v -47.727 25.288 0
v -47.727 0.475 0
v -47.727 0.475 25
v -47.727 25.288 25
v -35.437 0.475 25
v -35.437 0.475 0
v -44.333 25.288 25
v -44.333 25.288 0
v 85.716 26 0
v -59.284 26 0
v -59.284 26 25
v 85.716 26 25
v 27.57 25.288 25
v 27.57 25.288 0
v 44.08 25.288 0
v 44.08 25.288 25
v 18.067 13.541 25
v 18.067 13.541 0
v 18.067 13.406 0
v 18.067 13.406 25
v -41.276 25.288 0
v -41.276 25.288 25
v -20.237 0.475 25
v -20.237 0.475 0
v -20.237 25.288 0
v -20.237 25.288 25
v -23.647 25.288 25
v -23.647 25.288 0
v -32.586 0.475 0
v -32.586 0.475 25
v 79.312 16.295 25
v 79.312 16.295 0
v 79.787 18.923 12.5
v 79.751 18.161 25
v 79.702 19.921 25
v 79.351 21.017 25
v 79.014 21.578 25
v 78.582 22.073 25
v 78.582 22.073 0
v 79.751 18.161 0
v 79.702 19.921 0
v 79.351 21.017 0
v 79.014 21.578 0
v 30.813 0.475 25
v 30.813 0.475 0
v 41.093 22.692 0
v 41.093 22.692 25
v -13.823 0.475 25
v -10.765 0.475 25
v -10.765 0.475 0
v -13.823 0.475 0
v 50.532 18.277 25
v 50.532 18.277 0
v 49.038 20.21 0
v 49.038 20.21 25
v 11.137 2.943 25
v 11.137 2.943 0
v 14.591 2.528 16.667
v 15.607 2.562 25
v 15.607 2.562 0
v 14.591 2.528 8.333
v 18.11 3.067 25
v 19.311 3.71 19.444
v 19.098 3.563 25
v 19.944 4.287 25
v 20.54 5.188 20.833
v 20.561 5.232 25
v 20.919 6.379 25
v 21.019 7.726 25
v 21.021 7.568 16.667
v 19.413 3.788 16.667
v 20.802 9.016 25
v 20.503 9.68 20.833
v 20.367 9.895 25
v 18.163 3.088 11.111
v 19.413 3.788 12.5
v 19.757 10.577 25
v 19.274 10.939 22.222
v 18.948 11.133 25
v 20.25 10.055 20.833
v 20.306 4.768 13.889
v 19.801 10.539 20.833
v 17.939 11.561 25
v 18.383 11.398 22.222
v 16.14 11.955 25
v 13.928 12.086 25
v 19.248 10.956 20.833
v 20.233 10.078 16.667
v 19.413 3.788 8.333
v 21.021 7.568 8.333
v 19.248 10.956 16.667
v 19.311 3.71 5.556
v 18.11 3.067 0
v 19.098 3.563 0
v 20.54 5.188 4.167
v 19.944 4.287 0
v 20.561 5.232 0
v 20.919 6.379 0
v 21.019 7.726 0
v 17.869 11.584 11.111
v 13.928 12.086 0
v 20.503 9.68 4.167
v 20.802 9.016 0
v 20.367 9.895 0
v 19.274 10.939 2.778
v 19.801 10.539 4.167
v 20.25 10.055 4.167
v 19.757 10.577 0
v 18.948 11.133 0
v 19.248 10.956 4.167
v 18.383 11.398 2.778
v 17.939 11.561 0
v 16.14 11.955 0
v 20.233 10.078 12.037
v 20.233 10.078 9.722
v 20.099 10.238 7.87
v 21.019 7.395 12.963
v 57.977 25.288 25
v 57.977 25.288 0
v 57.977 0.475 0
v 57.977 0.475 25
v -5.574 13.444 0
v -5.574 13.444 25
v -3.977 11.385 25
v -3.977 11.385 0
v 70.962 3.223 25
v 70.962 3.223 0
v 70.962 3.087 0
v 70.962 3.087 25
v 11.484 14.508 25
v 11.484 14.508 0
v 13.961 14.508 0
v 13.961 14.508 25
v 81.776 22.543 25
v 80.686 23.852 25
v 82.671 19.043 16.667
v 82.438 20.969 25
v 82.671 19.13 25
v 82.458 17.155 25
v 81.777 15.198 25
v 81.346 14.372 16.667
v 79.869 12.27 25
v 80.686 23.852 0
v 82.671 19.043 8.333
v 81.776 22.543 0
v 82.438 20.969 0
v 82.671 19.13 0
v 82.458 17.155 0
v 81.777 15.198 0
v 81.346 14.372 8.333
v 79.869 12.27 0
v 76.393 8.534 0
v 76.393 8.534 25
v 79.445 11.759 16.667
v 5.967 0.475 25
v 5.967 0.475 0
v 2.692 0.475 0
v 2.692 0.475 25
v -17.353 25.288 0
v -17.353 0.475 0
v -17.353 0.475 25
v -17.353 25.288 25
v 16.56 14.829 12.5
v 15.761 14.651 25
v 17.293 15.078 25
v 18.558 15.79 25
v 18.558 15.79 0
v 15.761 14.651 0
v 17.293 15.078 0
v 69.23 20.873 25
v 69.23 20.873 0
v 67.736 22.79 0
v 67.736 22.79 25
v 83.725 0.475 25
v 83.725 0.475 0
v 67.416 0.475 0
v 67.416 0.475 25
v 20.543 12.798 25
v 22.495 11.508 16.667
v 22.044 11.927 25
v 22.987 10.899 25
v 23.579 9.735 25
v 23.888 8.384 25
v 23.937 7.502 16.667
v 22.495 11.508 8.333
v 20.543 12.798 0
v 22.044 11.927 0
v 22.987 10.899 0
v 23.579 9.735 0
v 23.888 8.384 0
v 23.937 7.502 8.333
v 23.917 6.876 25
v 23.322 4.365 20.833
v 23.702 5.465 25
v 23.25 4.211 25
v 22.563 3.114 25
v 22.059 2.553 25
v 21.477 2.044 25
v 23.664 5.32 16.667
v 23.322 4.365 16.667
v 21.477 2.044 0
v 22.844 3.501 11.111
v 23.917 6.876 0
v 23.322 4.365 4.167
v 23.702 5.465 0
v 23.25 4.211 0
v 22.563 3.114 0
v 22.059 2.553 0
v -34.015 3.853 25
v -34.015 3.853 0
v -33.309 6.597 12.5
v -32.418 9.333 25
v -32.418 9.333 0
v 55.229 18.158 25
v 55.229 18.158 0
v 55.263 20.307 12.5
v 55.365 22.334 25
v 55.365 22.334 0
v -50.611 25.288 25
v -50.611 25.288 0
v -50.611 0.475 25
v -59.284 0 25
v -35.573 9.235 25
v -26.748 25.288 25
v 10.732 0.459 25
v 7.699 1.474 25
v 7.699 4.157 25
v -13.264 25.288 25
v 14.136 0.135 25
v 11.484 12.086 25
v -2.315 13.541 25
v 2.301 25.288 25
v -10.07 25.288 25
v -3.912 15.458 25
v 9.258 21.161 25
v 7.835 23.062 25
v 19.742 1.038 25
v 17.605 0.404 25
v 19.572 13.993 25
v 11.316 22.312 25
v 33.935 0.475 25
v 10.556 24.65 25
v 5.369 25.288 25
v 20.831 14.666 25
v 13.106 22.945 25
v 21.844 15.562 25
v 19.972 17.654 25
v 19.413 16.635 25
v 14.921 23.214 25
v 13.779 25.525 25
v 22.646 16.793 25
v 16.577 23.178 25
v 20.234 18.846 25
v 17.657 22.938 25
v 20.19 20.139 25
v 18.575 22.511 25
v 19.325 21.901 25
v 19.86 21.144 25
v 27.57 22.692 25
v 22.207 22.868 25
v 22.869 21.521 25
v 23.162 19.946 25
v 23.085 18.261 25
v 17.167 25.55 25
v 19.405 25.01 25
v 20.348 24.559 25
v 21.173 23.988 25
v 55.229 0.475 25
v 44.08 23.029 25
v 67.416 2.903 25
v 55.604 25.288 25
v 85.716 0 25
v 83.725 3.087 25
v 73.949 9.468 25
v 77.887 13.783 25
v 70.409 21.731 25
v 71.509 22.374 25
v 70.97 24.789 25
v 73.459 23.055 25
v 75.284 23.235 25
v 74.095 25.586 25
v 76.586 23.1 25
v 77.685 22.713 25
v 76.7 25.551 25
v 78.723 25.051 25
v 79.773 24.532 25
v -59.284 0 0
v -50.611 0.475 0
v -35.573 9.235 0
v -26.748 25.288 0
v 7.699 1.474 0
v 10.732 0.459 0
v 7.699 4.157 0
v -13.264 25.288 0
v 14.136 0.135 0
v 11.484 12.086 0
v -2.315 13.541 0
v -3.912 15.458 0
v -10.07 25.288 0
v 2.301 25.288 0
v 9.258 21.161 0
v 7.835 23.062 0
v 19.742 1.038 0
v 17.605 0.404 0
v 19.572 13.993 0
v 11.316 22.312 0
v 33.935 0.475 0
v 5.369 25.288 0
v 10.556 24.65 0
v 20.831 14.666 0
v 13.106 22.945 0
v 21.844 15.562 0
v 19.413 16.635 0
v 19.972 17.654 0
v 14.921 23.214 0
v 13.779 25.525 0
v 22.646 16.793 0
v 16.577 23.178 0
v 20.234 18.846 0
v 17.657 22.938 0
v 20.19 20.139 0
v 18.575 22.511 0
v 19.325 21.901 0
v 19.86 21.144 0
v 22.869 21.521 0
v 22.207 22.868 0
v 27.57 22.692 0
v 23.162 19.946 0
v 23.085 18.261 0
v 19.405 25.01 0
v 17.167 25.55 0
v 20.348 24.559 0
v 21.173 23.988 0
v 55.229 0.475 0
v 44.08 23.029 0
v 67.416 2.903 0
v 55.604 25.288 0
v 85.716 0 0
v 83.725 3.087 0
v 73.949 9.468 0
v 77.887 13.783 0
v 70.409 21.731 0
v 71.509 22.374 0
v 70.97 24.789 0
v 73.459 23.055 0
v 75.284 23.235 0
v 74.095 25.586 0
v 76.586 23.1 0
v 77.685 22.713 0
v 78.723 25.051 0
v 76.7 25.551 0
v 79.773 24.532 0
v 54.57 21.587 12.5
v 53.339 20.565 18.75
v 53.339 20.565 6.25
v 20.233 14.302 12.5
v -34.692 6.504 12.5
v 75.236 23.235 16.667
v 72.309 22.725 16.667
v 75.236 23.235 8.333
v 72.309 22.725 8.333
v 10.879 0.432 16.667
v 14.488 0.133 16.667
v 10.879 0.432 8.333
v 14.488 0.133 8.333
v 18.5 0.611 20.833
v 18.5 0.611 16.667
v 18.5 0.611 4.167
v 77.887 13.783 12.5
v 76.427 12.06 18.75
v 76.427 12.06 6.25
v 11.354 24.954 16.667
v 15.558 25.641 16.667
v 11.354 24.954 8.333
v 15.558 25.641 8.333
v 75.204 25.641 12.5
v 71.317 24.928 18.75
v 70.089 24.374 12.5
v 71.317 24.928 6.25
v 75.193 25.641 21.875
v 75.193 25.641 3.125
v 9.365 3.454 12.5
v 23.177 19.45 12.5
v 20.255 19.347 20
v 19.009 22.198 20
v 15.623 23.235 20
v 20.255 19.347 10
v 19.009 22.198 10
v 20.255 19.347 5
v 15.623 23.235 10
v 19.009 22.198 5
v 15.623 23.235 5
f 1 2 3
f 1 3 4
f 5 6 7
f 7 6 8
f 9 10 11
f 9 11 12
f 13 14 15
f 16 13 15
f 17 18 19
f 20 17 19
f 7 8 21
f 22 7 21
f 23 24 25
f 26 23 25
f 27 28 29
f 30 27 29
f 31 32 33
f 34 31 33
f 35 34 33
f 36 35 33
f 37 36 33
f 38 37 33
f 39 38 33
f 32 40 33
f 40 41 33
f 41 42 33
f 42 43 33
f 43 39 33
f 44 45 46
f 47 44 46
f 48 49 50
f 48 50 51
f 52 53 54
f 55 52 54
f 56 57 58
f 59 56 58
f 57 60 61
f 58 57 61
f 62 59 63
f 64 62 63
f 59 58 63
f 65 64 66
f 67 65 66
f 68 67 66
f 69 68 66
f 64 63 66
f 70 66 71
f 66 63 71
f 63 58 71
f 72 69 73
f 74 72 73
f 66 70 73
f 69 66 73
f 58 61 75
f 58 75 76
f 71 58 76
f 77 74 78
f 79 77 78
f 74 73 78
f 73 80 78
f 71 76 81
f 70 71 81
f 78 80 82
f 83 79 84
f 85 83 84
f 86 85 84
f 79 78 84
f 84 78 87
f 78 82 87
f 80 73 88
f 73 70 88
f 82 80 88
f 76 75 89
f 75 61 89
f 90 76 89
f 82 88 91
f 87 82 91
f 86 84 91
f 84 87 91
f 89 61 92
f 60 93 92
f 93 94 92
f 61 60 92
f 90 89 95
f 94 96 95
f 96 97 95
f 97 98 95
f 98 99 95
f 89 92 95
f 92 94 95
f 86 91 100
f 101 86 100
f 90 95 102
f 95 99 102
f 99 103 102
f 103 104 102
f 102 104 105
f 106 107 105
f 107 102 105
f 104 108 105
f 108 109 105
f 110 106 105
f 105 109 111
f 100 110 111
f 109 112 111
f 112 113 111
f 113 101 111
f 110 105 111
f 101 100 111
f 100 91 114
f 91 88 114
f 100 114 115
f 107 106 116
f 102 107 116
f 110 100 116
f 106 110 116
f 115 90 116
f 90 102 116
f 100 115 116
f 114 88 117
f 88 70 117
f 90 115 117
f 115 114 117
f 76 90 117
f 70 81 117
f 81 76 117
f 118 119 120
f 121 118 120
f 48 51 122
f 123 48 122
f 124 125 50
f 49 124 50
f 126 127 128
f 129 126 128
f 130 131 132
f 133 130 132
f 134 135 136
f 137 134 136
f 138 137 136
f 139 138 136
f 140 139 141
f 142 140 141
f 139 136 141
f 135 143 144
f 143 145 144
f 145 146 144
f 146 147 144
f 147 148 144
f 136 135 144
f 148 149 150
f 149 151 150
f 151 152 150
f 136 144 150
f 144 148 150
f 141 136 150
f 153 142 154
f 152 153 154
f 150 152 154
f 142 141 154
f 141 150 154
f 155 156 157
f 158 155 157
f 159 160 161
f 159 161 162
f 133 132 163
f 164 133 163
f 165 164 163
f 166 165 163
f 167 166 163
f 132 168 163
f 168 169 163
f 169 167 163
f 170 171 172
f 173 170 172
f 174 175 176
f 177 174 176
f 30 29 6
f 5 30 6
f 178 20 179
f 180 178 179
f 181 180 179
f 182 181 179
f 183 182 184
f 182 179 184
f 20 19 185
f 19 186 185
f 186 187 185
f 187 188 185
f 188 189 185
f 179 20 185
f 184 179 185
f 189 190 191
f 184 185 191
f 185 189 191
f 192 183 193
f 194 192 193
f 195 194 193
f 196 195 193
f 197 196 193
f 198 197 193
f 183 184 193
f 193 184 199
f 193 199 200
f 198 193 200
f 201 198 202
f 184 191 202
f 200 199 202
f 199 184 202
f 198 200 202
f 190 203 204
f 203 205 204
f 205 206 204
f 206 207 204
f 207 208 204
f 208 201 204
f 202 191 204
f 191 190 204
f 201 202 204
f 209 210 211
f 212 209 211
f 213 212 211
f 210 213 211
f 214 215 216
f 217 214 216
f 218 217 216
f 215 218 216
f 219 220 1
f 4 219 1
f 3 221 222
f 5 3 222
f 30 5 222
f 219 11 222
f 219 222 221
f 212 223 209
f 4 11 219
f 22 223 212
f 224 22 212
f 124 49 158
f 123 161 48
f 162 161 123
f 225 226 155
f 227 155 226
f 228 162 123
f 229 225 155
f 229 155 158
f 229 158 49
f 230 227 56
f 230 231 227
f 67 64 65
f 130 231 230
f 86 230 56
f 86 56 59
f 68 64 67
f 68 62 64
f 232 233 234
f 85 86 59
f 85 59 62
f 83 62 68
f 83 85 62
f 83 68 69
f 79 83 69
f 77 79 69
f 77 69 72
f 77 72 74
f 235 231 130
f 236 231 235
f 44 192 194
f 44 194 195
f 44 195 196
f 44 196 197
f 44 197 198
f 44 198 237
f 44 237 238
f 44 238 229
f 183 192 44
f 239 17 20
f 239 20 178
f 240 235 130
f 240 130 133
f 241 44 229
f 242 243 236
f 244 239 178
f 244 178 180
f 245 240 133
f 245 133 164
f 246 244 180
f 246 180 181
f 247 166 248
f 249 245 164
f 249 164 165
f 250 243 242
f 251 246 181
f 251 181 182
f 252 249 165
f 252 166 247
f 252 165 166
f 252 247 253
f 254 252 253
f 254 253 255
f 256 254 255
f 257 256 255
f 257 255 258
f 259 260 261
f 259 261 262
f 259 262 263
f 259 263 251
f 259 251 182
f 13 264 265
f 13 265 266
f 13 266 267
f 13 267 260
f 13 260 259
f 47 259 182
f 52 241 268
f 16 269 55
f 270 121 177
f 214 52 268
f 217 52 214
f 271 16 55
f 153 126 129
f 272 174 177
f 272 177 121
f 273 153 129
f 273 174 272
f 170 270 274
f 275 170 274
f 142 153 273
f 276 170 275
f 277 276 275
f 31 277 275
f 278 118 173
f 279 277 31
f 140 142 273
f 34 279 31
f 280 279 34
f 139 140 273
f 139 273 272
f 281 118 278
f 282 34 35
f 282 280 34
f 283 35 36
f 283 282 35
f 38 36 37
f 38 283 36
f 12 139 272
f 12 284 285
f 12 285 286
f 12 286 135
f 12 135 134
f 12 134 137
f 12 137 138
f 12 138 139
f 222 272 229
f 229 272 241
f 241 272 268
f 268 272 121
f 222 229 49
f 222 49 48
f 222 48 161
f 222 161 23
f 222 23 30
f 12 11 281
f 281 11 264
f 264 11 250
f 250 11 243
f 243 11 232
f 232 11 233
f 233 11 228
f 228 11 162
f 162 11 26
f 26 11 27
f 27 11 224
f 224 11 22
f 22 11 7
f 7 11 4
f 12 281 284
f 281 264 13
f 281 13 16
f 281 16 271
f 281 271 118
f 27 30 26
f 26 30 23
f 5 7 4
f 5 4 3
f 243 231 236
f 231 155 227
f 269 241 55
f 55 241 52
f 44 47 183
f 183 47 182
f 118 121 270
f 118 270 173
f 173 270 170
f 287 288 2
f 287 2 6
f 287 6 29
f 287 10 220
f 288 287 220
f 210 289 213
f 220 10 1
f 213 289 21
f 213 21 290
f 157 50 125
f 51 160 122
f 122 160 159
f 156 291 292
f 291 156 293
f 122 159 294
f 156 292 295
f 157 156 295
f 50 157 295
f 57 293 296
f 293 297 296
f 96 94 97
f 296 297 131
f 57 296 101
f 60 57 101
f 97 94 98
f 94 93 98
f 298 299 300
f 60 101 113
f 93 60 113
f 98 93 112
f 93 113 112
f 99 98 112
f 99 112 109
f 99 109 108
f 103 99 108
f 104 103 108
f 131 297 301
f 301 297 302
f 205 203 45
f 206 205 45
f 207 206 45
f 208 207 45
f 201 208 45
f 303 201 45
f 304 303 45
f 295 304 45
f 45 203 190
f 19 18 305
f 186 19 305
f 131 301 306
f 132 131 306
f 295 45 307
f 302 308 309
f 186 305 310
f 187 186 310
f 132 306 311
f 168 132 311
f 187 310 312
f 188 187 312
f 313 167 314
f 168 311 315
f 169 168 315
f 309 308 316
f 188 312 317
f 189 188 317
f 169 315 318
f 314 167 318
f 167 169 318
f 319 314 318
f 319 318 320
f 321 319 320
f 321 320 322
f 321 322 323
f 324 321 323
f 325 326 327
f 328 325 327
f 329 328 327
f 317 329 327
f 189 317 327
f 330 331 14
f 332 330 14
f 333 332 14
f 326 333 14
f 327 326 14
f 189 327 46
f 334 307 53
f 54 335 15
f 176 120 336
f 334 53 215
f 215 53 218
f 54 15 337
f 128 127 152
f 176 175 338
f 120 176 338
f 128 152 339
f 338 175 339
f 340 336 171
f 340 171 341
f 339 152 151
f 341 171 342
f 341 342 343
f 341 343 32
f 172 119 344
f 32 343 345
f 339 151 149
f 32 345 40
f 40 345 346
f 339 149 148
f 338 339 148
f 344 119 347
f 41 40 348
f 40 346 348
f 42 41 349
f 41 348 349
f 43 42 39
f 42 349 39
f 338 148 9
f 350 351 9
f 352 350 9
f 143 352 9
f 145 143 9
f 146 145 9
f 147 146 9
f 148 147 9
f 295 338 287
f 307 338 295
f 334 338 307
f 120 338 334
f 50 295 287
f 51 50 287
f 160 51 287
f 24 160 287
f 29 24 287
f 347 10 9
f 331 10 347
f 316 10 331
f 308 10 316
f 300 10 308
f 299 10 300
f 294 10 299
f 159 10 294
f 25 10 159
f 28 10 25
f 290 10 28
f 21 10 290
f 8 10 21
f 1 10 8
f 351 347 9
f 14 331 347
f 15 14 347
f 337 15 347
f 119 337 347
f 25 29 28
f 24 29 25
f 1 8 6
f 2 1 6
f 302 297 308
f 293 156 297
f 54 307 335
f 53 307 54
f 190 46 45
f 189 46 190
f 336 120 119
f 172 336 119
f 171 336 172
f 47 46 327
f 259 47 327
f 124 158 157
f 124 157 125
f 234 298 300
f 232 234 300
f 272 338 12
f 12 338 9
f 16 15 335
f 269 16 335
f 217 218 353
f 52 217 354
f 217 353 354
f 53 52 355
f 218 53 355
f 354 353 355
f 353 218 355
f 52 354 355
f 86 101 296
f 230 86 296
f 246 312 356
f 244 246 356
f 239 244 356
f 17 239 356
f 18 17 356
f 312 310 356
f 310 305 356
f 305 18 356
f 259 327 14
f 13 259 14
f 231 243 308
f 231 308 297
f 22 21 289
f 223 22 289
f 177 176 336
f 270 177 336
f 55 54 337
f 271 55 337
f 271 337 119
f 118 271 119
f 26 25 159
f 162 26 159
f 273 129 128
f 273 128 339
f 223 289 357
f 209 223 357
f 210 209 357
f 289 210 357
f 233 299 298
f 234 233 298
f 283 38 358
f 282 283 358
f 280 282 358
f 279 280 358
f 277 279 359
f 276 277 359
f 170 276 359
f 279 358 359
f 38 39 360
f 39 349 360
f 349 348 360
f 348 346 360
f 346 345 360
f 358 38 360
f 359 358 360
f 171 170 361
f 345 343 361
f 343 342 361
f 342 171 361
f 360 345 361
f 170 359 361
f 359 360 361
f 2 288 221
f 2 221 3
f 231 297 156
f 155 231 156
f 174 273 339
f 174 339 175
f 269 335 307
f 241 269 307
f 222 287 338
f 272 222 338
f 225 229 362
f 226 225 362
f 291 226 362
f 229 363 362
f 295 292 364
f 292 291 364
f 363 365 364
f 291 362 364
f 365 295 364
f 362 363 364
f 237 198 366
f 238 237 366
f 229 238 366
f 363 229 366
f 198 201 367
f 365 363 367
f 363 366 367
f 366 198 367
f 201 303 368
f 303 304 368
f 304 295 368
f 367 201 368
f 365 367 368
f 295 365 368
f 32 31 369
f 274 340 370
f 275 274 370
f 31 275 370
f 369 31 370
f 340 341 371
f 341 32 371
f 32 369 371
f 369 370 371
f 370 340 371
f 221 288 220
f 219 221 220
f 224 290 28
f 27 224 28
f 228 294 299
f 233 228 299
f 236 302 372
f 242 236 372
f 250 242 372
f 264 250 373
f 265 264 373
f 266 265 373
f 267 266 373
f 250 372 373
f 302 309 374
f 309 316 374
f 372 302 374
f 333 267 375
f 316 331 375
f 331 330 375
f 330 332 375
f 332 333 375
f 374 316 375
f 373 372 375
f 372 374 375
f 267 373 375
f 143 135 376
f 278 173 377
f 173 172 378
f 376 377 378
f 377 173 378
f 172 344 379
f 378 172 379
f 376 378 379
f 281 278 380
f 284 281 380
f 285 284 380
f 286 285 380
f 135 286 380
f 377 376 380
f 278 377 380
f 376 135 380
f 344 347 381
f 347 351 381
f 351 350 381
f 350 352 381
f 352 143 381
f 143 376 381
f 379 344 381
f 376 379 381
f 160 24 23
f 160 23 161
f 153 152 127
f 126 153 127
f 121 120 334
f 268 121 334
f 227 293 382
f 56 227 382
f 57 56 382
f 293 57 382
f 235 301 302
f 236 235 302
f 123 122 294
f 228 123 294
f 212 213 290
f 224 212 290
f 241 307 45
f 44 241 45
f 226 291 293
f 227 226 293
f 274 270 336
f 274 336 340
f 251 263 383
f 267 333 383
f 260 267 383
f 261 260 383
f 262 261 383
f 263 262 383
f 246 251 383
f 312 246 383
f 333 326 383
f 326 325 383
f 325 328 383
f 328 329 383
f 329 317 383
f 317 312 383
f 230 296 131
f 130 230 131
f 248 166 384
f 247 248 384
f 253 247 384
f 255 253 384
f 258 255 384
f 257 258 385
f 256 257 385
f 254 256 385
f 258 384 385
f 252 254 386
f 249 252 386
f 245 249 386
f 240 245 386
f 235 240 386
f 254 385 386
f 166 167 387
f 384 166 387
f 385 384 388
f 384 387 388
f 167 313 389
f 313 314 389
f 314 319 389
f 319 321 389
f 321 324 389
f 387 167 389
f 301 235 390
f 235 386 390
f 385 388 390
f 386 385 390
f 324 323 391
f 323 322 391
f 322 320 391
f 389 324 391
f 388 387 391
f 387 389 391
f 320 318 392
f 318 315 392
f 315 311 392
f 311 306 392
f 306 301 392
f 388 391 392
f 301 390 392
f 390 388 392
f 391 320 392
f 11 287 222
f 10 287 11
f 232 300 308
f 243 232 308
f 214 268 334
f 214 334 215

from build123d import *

# Parameters (mm, degrees)
F0_W     = 145
F0_H     = 26
F0_W_2   = 2.8837425812
F0_H_2   = 24.8132200628
F1_DEPTH = 25


with BuildPart() as f1:
    # F0 (on Top) → F1 (new body)
    with BuildSketch(Plane.XY):
        with Locations((13.2160319388, 13)):
            Rectangle(F0_W, F0_H)
        with Locations((-49.1691383017, 12.881589666)):
            Rectangle(F0_W_2, F0_H_2, mode=Mode.SUBTRACT)
        with BuildLine():
            Line((-32.417906679, 9.3325769037), (-26.7481755025, 25.2881996974))
            Line((-26.7481755025, 25.2881996974), (-23.6472018417, 25.2881996974))
            Line((-23.6472018417, 25.2881996974), (-32.5862607657, 0.4749796346))
            Line((-32.5862607657, 0.4749796346), (-35.4374186849, 0.4749796346))
            Line((-35.4374186849, 0.4749796346), (-44.3330313929, 25.2881996974))
            Line((-44.3330313929, 25.2881996974), (-41.2755039481, 25.2881996974))
            Line((-41.2755039481, 25.2881996974), (-35.5731881096, 9.2348229179))
            add(Edge.make_bspline(
                [(-35.5731881096, 9.2348229179), (-34.5902174746, 6.4651266535), (-34.0145551138, 3.8529229218)],
                knots=[0, 0, 0, 1, 1, 1], degree=2))
            add(Edge.make_bspline(
                [(-34.0145551138, 3.8529229218), (-33.400877314, 6.6008960782), (-32.417906679, 9.3325769037)],
                knots=[0, 0, 0, 1, 1, 1], degree=2))
        make_face(mode=Mode.SUBTRACT)
        with Locations((-18.7948026021, 12.881589666)):
            Rectangle(F0_W_2, F0_H_2, mode=Mode.SUBTRACT)
        Polygon((-2.3151098289, 13.5414290702), (5.9668250794, 0.4749796346), (2.692066555, 0.4749796346), (-3.9769275875, 11.3854106055), (-10.7653988238, 0.4749796346), (-13.8229262686, 0.4749796346), (-5.5735760223, 13.4436750844), (-13.2635562387, 25.2881996974), (-10.0702593692, 25.2881996974), (-3.9117582636, 15.4584933473), (2.3010506118, 25.2881996974), (5.3694396106, 25.2881996974), align=None, mode=Mode.SUBTRACT)
        with BuildLine():
            add(Edge.make_bspline(
                [(21.1730006487, 23.9875286086), (23.1769573576, 22.3338570154), (23.1769573576, 19.4501144342)],
                knots=[0, 0, 0, 1, 1, 1], degree=2))
            add(Edge.make_bspline(
                [(23.1769573576, 19.4501144342), (23.1769573576, 17.071434113), (21.8437016068, 15.5616781101)],
                knots=[0, 0, 0, 1, 1, 1], degree=2))
            add(Edge.make_bspline(
                [(21.8437016068, 15.5616781101), (20.510445856, 14.0519221071), (18.0665962109, 13.5414290702)],
                knots=[0, 0, 0, 1, 1, 1], degree=2))
            Line((18.0665962109, 13.5414290702), (18.0665962109, 13.4056596454))
            add(Edge.make_bspline(
                [(18.0665962109, 13.4056596454), (21.0535235549, 13.0363668102), (22.4953948455, 11.5076030878)],
                knots=[0, 0, 0, 1, 1, 1], degree=2))
            add(Edge.make_bspline(
                [(22.4953948455, 11.5076030878), (23.9372661361, 9.9788393654), (23.9372661361, 7.5024050584)],
                knots=[0, 0, 0, 1, 1, 1], degree=2))
            add(Edge.make_bspline(
                [(23.9372661361, 7.5024050584), (23.9372661361, 3.9561076845), (21.47712416, 2.0444741844)],
                knots=[0, 0, 0, 1, 1, 1], degree=2))
            add(Edge.make_bspline(
                [(21.47712416, 2.0444741844), (19.016982184, 0.1328406843), (14.4877141752, 0.1328406843)],
                knots=[0, 0, 0, 1, 1, 1], degree=2))
            add(Edge.make_bspline(
                [(14.4877141752, 0.1328406843), (12.5163421282, 0.1328406843), (10.878962866, 0.4315334187)],
                knots=[0, 0, 0, 1, 1, 1], degree=2))
            add(Edge.make_bspline(
                [(10.878962866, 0.4315334187), (9.2415836038, 0.7302261531), (7.6992429389, 1.4742426006)],
                knots=[0, 0, 0, 1, 1, 1], degree=2))
            Line((7.6992429389, 1.4742426006), (7.6992429389, 4.1570464331))
            add(Edge.make_bspline(
                [(7.6992429389, 4.1570464331), (9.3121837046, 3.3587222158), (11.1369247729, 2.9432677761)],
                knots=[0, 0, 0, 1, 1, 1], degree=2))
            add(Edge.make_bspline(
                [(11.1369247729, 2.9432677761), (12.9616658413, 2.5278133364), (14.590898938, 2.5278133364)],
                knots=[0, 0, 0, 1, 1, 1], degree=2))
            add(Edge.make_bspline(
                [(14.590898938, 2.5278133364), (21.020938893, 2.5278133364), (21.020938893, 7.5675743822)],
                knots=[0, 0, 0, 1, 1, 1], degree=2))
            add(Edge.make_bspline(
                [(21.020938893, 7.5675743822), (21.020938893, 12.0859808371), (13.9283441453, 12.0859808371)],
                knots=[0, 0, 0, 1, 1, 1], degree=2))
            Line((13.9283441453, 12.0859808371), (11.4844945002, 12.0859808371))
            Line((11.4844945002, 12.0859808371), (11.4844945002, 14.5081073742))
            Line((11.4844945002, 14.5081073742), (13.9609288072, 14.5081073742))
            add(Edge.make_bspline(
                [(13.9609288072, 14.5081073742), (16.8609637194, 14.5081073742), (18.5580815284, 15.7897707436)],
                knots=[0, 0, 0, 1, 1, 1], degree=2))
            add(Edge.make_bspline(
                [(18.5580815284, 15.7897707436), (20.2551993375, 17.071434113), (20.2551993375, 19.3469296714)],
                knots=[0, 0, 0, 1, 1, 1], degree=2))
            add(Edge.make_bspline(
                [(20.2551993375, 19.3469296714), (20.2551993375, 21.1608091858), (19.0088360185, 22.1980875907)],
                knots=[0, 0, 0, 1, 1, 1], degree=2))
            add(Edge.make_bspline(
                [(19.0088360185, 22.1980875907), (17.7624726995, 23.2353659956), (15.6227465659, 23.2353659956)],
                knots=[0, 0, 0, 1, 1, 1], degree=2))
            add(Edge.make_bspline(
                [(15.6227465659, 23.2353659956), (13.9935134692, 23.2353659956), (12.5516421786, 22.792757671)],
                knots=[0, 0, 0, 1, 1, 1], degree=2))
            add(Edge.make_bspline(
                [(12.5516421786, 22.792757671), (11.109770888, 22.3501493464), (9.2578759347, 21.1608091858)],
                knots=[0, 0, 0, 1, 1, 1], degree=2))
            Line((9.2578759347, 21.1608091858), (7.8350123636, 23.0615811319))
            add(Edge.make_bspline(
                [(7.8350123636, 23.0615811319), (9.3610606975, 24.2672136235), (11.3541558525, 24.9542069126)],
                knots=[0, 0, 0, 1, 1, 1], degree=2))
            add(Edge.make_bspline(
                [(11.3541558525, 24.9542069126), (13.3472510075, 25.6412002017), (15.557577242, 25.6412002017)],
                knots=[0, 0, 0, 1, 1, 1], degree=2))
            add(Edge.make_bspline(
                [(15.557577242, 25.6412002017), (19.1690439397, 25.6412002017), (21.1730006487, 23.9875286086)],
                knots=[0, 0, 0, 1, 1, 1], degree=2))
        make_face(mode=Mode.SUBTRACT)
        Polygon((33.9353265729, 0.4749796346), (30.8126298042, 0.4749796346), (41.0930906444, 22.6922882967), (27.5704559417, 22.6922882967), (27.5704559417, 25.2881996974), (44.0800179883, 25.2881996974), (44.0800179883, 23.02899647), align=None, mode=Mode.SUBTRACT)
        with BuildLine():
            Line((57.9773763033, 25.2881996974), (57.9773763033, 0.4749796346))
            Line((57.9773763033, 0.4749796346), (55.2294031468, 0.4749796346))
            Line((55.2294031468, 0.4749796346), (55.2294031468, 18.1575895108))
            add(Edge.make_bspline(
                [(55.2294031468, 18.1575895108), (55.2294031468, 20.3679157454), (55.3651725715, 22.3338570154)],
                knots=[0, 0, 0, 1, 1, 1], degree=2))
            add(Edge.make_bspline(
                [(55.3651725715, 22.3338570154), (55.0121720672, 21.9754257341), (54.5695637426, 21.5871251794)],
                knots=[0, 0, 0, 1, 1, 1], degree=2))
            add(Edge.make_bspline(
                [(54.5695637426, 21.5871251794), (54.126955418, 21.1988246247), (50.5317810513, 18.2770666046)],
                knots=[0, 0, 0, 1, 1, 1], degree=2))
            Line((50.5317810513, 18.2770666046), (49.0383173793, 20.2104232127))
            Line((49.0383173793, 20.2104232127), (55.6041267591, 25.2881996974))
            Line((55.6041267591, 25.2881996974), (57.9773763033, 25.2881996974))
        make_face(mode=Mode.SUBTRACT)
        with BuildLine():
            Line((83.7246900082, 3.0871833663), (83.7246900082, 0.4749796346))
            Line((83.7246900082, 0.4749796346), (67.4160667102, 0.4749796346))
            Line((67.4160667102, 0.4749796346), (67.4160667102, 2.9025369487))
            Line((67.4160667102, 2.9025369487), (73.949291428, 9.4683463284))
            add(Edge.make_bspline(
                [(73.949291428, 9.4683463284), (76.9362187719, 12.4932891113), (77.886604745, 13.7830986462)],
                knots=[0, 0, 0, 1, 1, 1], degree=2))
            add(Edge.make_bspline(
                [(77.886604745, 13.7830986462), (78.8369907181, 15.0729081811), (79.3121837046, 16.2948330036)],
                knots=[0, 0, 0, 1, 1, 1], degree=2))
            add(Edge.make_bspline(
                [(79.3121837046, 16.2948330036), (79.7873766912, 17.5167578261), (79.7873766912, 18.9233290663)],
                knots=[0, 0, 0, 1, 1, 1], degree=2))
            add(Edge.make_bspline(
                [(79.7873766912, 18.9233290663), (79.7873766912, 20.9109934443), (78.5817441996, 22.0731797199)],
                knots=[0, 0, 0, 1, 1, 1], degree=2))
            add(Edge.make_bspline(
                [(78.5817441996, 22.0731797199), (77.376111708, 23.2353659956), (75.2363855744, 23.2353659956)],
                knots=[0, 0, 0, 1, 1, 1], degree=2))
            add(Edge.make_bspline(
                [(75.2363855744, 23.2353659956), (73.6940449095, 23.2353659956), (72.3091967773, 22.7248729586)],
                knots=[0, 0, 0, 1, 1, 1], degree=2))
            add(Edge.make_bspline(
                [(72.3091967773, 22.7248729586), (70.9243486451, 22.2143799216), (69.2299462245, 20.8729780054)],
                knots=[0, 0, 0, 1, 1, 1], degree=2))
            Line((69.2299462245, 20.8729780054), (67.7364825525, 22.7900422825))
            add(Edge.make_bspline(
                [(67.7364825525, 22.7900422825), (71.1633028326, 25.6412002017), (75.2038009124, 25.6412002017)],
                knots=[0, 0, 0, 1, 1, 1], degree=2))
            add(Edge.make_bspline(
                [(75.2038009124, 25.6412002017), (78.7012212934, 25.6412002017), (80.6861702829, 23.8517591838)],
                knots=[0, 0, 0, 1, 1, 1], degree=2))
            add(Edge.make_bspline(
                [(80.6861702829, 23.8517591838), (82.6711192723, 22.0623181659), (82.6711192723, 19.0428061601)],
                knots=[0, 0, 0, 1, 1, 1], degree=2))
            add(Edge.make_bspline(
                [(82.6711192723, 19.0428061601), (82.6711192723, 16.6804181698), (81.346009687, 14.3723379495)],
                knots=[0, 0, 0, 1, 1, 1], degree=2))
            add(Edge.make_bspline(
                [(81.346009687, 14.3723379495), (80.0209001017, 12.0642577292), (76.393141073, 8.5342526863)],
                knots=[0, 0, 0, 1, 1, 1], degree=2))
            Line((76.393141073, 8.5342526863), (70.962364084, 3.222952791))
            Line((70.962364084, 3.222952791), (70.962364084, 3.0871833663))
            Line((70.962364084, 3.0871833663), (83.7246900082, 3.0871833663))
        make_face(mode=Mode.SUBTRACT)
    extrude(amount=F1_DEPTH)


solid = f1.part
